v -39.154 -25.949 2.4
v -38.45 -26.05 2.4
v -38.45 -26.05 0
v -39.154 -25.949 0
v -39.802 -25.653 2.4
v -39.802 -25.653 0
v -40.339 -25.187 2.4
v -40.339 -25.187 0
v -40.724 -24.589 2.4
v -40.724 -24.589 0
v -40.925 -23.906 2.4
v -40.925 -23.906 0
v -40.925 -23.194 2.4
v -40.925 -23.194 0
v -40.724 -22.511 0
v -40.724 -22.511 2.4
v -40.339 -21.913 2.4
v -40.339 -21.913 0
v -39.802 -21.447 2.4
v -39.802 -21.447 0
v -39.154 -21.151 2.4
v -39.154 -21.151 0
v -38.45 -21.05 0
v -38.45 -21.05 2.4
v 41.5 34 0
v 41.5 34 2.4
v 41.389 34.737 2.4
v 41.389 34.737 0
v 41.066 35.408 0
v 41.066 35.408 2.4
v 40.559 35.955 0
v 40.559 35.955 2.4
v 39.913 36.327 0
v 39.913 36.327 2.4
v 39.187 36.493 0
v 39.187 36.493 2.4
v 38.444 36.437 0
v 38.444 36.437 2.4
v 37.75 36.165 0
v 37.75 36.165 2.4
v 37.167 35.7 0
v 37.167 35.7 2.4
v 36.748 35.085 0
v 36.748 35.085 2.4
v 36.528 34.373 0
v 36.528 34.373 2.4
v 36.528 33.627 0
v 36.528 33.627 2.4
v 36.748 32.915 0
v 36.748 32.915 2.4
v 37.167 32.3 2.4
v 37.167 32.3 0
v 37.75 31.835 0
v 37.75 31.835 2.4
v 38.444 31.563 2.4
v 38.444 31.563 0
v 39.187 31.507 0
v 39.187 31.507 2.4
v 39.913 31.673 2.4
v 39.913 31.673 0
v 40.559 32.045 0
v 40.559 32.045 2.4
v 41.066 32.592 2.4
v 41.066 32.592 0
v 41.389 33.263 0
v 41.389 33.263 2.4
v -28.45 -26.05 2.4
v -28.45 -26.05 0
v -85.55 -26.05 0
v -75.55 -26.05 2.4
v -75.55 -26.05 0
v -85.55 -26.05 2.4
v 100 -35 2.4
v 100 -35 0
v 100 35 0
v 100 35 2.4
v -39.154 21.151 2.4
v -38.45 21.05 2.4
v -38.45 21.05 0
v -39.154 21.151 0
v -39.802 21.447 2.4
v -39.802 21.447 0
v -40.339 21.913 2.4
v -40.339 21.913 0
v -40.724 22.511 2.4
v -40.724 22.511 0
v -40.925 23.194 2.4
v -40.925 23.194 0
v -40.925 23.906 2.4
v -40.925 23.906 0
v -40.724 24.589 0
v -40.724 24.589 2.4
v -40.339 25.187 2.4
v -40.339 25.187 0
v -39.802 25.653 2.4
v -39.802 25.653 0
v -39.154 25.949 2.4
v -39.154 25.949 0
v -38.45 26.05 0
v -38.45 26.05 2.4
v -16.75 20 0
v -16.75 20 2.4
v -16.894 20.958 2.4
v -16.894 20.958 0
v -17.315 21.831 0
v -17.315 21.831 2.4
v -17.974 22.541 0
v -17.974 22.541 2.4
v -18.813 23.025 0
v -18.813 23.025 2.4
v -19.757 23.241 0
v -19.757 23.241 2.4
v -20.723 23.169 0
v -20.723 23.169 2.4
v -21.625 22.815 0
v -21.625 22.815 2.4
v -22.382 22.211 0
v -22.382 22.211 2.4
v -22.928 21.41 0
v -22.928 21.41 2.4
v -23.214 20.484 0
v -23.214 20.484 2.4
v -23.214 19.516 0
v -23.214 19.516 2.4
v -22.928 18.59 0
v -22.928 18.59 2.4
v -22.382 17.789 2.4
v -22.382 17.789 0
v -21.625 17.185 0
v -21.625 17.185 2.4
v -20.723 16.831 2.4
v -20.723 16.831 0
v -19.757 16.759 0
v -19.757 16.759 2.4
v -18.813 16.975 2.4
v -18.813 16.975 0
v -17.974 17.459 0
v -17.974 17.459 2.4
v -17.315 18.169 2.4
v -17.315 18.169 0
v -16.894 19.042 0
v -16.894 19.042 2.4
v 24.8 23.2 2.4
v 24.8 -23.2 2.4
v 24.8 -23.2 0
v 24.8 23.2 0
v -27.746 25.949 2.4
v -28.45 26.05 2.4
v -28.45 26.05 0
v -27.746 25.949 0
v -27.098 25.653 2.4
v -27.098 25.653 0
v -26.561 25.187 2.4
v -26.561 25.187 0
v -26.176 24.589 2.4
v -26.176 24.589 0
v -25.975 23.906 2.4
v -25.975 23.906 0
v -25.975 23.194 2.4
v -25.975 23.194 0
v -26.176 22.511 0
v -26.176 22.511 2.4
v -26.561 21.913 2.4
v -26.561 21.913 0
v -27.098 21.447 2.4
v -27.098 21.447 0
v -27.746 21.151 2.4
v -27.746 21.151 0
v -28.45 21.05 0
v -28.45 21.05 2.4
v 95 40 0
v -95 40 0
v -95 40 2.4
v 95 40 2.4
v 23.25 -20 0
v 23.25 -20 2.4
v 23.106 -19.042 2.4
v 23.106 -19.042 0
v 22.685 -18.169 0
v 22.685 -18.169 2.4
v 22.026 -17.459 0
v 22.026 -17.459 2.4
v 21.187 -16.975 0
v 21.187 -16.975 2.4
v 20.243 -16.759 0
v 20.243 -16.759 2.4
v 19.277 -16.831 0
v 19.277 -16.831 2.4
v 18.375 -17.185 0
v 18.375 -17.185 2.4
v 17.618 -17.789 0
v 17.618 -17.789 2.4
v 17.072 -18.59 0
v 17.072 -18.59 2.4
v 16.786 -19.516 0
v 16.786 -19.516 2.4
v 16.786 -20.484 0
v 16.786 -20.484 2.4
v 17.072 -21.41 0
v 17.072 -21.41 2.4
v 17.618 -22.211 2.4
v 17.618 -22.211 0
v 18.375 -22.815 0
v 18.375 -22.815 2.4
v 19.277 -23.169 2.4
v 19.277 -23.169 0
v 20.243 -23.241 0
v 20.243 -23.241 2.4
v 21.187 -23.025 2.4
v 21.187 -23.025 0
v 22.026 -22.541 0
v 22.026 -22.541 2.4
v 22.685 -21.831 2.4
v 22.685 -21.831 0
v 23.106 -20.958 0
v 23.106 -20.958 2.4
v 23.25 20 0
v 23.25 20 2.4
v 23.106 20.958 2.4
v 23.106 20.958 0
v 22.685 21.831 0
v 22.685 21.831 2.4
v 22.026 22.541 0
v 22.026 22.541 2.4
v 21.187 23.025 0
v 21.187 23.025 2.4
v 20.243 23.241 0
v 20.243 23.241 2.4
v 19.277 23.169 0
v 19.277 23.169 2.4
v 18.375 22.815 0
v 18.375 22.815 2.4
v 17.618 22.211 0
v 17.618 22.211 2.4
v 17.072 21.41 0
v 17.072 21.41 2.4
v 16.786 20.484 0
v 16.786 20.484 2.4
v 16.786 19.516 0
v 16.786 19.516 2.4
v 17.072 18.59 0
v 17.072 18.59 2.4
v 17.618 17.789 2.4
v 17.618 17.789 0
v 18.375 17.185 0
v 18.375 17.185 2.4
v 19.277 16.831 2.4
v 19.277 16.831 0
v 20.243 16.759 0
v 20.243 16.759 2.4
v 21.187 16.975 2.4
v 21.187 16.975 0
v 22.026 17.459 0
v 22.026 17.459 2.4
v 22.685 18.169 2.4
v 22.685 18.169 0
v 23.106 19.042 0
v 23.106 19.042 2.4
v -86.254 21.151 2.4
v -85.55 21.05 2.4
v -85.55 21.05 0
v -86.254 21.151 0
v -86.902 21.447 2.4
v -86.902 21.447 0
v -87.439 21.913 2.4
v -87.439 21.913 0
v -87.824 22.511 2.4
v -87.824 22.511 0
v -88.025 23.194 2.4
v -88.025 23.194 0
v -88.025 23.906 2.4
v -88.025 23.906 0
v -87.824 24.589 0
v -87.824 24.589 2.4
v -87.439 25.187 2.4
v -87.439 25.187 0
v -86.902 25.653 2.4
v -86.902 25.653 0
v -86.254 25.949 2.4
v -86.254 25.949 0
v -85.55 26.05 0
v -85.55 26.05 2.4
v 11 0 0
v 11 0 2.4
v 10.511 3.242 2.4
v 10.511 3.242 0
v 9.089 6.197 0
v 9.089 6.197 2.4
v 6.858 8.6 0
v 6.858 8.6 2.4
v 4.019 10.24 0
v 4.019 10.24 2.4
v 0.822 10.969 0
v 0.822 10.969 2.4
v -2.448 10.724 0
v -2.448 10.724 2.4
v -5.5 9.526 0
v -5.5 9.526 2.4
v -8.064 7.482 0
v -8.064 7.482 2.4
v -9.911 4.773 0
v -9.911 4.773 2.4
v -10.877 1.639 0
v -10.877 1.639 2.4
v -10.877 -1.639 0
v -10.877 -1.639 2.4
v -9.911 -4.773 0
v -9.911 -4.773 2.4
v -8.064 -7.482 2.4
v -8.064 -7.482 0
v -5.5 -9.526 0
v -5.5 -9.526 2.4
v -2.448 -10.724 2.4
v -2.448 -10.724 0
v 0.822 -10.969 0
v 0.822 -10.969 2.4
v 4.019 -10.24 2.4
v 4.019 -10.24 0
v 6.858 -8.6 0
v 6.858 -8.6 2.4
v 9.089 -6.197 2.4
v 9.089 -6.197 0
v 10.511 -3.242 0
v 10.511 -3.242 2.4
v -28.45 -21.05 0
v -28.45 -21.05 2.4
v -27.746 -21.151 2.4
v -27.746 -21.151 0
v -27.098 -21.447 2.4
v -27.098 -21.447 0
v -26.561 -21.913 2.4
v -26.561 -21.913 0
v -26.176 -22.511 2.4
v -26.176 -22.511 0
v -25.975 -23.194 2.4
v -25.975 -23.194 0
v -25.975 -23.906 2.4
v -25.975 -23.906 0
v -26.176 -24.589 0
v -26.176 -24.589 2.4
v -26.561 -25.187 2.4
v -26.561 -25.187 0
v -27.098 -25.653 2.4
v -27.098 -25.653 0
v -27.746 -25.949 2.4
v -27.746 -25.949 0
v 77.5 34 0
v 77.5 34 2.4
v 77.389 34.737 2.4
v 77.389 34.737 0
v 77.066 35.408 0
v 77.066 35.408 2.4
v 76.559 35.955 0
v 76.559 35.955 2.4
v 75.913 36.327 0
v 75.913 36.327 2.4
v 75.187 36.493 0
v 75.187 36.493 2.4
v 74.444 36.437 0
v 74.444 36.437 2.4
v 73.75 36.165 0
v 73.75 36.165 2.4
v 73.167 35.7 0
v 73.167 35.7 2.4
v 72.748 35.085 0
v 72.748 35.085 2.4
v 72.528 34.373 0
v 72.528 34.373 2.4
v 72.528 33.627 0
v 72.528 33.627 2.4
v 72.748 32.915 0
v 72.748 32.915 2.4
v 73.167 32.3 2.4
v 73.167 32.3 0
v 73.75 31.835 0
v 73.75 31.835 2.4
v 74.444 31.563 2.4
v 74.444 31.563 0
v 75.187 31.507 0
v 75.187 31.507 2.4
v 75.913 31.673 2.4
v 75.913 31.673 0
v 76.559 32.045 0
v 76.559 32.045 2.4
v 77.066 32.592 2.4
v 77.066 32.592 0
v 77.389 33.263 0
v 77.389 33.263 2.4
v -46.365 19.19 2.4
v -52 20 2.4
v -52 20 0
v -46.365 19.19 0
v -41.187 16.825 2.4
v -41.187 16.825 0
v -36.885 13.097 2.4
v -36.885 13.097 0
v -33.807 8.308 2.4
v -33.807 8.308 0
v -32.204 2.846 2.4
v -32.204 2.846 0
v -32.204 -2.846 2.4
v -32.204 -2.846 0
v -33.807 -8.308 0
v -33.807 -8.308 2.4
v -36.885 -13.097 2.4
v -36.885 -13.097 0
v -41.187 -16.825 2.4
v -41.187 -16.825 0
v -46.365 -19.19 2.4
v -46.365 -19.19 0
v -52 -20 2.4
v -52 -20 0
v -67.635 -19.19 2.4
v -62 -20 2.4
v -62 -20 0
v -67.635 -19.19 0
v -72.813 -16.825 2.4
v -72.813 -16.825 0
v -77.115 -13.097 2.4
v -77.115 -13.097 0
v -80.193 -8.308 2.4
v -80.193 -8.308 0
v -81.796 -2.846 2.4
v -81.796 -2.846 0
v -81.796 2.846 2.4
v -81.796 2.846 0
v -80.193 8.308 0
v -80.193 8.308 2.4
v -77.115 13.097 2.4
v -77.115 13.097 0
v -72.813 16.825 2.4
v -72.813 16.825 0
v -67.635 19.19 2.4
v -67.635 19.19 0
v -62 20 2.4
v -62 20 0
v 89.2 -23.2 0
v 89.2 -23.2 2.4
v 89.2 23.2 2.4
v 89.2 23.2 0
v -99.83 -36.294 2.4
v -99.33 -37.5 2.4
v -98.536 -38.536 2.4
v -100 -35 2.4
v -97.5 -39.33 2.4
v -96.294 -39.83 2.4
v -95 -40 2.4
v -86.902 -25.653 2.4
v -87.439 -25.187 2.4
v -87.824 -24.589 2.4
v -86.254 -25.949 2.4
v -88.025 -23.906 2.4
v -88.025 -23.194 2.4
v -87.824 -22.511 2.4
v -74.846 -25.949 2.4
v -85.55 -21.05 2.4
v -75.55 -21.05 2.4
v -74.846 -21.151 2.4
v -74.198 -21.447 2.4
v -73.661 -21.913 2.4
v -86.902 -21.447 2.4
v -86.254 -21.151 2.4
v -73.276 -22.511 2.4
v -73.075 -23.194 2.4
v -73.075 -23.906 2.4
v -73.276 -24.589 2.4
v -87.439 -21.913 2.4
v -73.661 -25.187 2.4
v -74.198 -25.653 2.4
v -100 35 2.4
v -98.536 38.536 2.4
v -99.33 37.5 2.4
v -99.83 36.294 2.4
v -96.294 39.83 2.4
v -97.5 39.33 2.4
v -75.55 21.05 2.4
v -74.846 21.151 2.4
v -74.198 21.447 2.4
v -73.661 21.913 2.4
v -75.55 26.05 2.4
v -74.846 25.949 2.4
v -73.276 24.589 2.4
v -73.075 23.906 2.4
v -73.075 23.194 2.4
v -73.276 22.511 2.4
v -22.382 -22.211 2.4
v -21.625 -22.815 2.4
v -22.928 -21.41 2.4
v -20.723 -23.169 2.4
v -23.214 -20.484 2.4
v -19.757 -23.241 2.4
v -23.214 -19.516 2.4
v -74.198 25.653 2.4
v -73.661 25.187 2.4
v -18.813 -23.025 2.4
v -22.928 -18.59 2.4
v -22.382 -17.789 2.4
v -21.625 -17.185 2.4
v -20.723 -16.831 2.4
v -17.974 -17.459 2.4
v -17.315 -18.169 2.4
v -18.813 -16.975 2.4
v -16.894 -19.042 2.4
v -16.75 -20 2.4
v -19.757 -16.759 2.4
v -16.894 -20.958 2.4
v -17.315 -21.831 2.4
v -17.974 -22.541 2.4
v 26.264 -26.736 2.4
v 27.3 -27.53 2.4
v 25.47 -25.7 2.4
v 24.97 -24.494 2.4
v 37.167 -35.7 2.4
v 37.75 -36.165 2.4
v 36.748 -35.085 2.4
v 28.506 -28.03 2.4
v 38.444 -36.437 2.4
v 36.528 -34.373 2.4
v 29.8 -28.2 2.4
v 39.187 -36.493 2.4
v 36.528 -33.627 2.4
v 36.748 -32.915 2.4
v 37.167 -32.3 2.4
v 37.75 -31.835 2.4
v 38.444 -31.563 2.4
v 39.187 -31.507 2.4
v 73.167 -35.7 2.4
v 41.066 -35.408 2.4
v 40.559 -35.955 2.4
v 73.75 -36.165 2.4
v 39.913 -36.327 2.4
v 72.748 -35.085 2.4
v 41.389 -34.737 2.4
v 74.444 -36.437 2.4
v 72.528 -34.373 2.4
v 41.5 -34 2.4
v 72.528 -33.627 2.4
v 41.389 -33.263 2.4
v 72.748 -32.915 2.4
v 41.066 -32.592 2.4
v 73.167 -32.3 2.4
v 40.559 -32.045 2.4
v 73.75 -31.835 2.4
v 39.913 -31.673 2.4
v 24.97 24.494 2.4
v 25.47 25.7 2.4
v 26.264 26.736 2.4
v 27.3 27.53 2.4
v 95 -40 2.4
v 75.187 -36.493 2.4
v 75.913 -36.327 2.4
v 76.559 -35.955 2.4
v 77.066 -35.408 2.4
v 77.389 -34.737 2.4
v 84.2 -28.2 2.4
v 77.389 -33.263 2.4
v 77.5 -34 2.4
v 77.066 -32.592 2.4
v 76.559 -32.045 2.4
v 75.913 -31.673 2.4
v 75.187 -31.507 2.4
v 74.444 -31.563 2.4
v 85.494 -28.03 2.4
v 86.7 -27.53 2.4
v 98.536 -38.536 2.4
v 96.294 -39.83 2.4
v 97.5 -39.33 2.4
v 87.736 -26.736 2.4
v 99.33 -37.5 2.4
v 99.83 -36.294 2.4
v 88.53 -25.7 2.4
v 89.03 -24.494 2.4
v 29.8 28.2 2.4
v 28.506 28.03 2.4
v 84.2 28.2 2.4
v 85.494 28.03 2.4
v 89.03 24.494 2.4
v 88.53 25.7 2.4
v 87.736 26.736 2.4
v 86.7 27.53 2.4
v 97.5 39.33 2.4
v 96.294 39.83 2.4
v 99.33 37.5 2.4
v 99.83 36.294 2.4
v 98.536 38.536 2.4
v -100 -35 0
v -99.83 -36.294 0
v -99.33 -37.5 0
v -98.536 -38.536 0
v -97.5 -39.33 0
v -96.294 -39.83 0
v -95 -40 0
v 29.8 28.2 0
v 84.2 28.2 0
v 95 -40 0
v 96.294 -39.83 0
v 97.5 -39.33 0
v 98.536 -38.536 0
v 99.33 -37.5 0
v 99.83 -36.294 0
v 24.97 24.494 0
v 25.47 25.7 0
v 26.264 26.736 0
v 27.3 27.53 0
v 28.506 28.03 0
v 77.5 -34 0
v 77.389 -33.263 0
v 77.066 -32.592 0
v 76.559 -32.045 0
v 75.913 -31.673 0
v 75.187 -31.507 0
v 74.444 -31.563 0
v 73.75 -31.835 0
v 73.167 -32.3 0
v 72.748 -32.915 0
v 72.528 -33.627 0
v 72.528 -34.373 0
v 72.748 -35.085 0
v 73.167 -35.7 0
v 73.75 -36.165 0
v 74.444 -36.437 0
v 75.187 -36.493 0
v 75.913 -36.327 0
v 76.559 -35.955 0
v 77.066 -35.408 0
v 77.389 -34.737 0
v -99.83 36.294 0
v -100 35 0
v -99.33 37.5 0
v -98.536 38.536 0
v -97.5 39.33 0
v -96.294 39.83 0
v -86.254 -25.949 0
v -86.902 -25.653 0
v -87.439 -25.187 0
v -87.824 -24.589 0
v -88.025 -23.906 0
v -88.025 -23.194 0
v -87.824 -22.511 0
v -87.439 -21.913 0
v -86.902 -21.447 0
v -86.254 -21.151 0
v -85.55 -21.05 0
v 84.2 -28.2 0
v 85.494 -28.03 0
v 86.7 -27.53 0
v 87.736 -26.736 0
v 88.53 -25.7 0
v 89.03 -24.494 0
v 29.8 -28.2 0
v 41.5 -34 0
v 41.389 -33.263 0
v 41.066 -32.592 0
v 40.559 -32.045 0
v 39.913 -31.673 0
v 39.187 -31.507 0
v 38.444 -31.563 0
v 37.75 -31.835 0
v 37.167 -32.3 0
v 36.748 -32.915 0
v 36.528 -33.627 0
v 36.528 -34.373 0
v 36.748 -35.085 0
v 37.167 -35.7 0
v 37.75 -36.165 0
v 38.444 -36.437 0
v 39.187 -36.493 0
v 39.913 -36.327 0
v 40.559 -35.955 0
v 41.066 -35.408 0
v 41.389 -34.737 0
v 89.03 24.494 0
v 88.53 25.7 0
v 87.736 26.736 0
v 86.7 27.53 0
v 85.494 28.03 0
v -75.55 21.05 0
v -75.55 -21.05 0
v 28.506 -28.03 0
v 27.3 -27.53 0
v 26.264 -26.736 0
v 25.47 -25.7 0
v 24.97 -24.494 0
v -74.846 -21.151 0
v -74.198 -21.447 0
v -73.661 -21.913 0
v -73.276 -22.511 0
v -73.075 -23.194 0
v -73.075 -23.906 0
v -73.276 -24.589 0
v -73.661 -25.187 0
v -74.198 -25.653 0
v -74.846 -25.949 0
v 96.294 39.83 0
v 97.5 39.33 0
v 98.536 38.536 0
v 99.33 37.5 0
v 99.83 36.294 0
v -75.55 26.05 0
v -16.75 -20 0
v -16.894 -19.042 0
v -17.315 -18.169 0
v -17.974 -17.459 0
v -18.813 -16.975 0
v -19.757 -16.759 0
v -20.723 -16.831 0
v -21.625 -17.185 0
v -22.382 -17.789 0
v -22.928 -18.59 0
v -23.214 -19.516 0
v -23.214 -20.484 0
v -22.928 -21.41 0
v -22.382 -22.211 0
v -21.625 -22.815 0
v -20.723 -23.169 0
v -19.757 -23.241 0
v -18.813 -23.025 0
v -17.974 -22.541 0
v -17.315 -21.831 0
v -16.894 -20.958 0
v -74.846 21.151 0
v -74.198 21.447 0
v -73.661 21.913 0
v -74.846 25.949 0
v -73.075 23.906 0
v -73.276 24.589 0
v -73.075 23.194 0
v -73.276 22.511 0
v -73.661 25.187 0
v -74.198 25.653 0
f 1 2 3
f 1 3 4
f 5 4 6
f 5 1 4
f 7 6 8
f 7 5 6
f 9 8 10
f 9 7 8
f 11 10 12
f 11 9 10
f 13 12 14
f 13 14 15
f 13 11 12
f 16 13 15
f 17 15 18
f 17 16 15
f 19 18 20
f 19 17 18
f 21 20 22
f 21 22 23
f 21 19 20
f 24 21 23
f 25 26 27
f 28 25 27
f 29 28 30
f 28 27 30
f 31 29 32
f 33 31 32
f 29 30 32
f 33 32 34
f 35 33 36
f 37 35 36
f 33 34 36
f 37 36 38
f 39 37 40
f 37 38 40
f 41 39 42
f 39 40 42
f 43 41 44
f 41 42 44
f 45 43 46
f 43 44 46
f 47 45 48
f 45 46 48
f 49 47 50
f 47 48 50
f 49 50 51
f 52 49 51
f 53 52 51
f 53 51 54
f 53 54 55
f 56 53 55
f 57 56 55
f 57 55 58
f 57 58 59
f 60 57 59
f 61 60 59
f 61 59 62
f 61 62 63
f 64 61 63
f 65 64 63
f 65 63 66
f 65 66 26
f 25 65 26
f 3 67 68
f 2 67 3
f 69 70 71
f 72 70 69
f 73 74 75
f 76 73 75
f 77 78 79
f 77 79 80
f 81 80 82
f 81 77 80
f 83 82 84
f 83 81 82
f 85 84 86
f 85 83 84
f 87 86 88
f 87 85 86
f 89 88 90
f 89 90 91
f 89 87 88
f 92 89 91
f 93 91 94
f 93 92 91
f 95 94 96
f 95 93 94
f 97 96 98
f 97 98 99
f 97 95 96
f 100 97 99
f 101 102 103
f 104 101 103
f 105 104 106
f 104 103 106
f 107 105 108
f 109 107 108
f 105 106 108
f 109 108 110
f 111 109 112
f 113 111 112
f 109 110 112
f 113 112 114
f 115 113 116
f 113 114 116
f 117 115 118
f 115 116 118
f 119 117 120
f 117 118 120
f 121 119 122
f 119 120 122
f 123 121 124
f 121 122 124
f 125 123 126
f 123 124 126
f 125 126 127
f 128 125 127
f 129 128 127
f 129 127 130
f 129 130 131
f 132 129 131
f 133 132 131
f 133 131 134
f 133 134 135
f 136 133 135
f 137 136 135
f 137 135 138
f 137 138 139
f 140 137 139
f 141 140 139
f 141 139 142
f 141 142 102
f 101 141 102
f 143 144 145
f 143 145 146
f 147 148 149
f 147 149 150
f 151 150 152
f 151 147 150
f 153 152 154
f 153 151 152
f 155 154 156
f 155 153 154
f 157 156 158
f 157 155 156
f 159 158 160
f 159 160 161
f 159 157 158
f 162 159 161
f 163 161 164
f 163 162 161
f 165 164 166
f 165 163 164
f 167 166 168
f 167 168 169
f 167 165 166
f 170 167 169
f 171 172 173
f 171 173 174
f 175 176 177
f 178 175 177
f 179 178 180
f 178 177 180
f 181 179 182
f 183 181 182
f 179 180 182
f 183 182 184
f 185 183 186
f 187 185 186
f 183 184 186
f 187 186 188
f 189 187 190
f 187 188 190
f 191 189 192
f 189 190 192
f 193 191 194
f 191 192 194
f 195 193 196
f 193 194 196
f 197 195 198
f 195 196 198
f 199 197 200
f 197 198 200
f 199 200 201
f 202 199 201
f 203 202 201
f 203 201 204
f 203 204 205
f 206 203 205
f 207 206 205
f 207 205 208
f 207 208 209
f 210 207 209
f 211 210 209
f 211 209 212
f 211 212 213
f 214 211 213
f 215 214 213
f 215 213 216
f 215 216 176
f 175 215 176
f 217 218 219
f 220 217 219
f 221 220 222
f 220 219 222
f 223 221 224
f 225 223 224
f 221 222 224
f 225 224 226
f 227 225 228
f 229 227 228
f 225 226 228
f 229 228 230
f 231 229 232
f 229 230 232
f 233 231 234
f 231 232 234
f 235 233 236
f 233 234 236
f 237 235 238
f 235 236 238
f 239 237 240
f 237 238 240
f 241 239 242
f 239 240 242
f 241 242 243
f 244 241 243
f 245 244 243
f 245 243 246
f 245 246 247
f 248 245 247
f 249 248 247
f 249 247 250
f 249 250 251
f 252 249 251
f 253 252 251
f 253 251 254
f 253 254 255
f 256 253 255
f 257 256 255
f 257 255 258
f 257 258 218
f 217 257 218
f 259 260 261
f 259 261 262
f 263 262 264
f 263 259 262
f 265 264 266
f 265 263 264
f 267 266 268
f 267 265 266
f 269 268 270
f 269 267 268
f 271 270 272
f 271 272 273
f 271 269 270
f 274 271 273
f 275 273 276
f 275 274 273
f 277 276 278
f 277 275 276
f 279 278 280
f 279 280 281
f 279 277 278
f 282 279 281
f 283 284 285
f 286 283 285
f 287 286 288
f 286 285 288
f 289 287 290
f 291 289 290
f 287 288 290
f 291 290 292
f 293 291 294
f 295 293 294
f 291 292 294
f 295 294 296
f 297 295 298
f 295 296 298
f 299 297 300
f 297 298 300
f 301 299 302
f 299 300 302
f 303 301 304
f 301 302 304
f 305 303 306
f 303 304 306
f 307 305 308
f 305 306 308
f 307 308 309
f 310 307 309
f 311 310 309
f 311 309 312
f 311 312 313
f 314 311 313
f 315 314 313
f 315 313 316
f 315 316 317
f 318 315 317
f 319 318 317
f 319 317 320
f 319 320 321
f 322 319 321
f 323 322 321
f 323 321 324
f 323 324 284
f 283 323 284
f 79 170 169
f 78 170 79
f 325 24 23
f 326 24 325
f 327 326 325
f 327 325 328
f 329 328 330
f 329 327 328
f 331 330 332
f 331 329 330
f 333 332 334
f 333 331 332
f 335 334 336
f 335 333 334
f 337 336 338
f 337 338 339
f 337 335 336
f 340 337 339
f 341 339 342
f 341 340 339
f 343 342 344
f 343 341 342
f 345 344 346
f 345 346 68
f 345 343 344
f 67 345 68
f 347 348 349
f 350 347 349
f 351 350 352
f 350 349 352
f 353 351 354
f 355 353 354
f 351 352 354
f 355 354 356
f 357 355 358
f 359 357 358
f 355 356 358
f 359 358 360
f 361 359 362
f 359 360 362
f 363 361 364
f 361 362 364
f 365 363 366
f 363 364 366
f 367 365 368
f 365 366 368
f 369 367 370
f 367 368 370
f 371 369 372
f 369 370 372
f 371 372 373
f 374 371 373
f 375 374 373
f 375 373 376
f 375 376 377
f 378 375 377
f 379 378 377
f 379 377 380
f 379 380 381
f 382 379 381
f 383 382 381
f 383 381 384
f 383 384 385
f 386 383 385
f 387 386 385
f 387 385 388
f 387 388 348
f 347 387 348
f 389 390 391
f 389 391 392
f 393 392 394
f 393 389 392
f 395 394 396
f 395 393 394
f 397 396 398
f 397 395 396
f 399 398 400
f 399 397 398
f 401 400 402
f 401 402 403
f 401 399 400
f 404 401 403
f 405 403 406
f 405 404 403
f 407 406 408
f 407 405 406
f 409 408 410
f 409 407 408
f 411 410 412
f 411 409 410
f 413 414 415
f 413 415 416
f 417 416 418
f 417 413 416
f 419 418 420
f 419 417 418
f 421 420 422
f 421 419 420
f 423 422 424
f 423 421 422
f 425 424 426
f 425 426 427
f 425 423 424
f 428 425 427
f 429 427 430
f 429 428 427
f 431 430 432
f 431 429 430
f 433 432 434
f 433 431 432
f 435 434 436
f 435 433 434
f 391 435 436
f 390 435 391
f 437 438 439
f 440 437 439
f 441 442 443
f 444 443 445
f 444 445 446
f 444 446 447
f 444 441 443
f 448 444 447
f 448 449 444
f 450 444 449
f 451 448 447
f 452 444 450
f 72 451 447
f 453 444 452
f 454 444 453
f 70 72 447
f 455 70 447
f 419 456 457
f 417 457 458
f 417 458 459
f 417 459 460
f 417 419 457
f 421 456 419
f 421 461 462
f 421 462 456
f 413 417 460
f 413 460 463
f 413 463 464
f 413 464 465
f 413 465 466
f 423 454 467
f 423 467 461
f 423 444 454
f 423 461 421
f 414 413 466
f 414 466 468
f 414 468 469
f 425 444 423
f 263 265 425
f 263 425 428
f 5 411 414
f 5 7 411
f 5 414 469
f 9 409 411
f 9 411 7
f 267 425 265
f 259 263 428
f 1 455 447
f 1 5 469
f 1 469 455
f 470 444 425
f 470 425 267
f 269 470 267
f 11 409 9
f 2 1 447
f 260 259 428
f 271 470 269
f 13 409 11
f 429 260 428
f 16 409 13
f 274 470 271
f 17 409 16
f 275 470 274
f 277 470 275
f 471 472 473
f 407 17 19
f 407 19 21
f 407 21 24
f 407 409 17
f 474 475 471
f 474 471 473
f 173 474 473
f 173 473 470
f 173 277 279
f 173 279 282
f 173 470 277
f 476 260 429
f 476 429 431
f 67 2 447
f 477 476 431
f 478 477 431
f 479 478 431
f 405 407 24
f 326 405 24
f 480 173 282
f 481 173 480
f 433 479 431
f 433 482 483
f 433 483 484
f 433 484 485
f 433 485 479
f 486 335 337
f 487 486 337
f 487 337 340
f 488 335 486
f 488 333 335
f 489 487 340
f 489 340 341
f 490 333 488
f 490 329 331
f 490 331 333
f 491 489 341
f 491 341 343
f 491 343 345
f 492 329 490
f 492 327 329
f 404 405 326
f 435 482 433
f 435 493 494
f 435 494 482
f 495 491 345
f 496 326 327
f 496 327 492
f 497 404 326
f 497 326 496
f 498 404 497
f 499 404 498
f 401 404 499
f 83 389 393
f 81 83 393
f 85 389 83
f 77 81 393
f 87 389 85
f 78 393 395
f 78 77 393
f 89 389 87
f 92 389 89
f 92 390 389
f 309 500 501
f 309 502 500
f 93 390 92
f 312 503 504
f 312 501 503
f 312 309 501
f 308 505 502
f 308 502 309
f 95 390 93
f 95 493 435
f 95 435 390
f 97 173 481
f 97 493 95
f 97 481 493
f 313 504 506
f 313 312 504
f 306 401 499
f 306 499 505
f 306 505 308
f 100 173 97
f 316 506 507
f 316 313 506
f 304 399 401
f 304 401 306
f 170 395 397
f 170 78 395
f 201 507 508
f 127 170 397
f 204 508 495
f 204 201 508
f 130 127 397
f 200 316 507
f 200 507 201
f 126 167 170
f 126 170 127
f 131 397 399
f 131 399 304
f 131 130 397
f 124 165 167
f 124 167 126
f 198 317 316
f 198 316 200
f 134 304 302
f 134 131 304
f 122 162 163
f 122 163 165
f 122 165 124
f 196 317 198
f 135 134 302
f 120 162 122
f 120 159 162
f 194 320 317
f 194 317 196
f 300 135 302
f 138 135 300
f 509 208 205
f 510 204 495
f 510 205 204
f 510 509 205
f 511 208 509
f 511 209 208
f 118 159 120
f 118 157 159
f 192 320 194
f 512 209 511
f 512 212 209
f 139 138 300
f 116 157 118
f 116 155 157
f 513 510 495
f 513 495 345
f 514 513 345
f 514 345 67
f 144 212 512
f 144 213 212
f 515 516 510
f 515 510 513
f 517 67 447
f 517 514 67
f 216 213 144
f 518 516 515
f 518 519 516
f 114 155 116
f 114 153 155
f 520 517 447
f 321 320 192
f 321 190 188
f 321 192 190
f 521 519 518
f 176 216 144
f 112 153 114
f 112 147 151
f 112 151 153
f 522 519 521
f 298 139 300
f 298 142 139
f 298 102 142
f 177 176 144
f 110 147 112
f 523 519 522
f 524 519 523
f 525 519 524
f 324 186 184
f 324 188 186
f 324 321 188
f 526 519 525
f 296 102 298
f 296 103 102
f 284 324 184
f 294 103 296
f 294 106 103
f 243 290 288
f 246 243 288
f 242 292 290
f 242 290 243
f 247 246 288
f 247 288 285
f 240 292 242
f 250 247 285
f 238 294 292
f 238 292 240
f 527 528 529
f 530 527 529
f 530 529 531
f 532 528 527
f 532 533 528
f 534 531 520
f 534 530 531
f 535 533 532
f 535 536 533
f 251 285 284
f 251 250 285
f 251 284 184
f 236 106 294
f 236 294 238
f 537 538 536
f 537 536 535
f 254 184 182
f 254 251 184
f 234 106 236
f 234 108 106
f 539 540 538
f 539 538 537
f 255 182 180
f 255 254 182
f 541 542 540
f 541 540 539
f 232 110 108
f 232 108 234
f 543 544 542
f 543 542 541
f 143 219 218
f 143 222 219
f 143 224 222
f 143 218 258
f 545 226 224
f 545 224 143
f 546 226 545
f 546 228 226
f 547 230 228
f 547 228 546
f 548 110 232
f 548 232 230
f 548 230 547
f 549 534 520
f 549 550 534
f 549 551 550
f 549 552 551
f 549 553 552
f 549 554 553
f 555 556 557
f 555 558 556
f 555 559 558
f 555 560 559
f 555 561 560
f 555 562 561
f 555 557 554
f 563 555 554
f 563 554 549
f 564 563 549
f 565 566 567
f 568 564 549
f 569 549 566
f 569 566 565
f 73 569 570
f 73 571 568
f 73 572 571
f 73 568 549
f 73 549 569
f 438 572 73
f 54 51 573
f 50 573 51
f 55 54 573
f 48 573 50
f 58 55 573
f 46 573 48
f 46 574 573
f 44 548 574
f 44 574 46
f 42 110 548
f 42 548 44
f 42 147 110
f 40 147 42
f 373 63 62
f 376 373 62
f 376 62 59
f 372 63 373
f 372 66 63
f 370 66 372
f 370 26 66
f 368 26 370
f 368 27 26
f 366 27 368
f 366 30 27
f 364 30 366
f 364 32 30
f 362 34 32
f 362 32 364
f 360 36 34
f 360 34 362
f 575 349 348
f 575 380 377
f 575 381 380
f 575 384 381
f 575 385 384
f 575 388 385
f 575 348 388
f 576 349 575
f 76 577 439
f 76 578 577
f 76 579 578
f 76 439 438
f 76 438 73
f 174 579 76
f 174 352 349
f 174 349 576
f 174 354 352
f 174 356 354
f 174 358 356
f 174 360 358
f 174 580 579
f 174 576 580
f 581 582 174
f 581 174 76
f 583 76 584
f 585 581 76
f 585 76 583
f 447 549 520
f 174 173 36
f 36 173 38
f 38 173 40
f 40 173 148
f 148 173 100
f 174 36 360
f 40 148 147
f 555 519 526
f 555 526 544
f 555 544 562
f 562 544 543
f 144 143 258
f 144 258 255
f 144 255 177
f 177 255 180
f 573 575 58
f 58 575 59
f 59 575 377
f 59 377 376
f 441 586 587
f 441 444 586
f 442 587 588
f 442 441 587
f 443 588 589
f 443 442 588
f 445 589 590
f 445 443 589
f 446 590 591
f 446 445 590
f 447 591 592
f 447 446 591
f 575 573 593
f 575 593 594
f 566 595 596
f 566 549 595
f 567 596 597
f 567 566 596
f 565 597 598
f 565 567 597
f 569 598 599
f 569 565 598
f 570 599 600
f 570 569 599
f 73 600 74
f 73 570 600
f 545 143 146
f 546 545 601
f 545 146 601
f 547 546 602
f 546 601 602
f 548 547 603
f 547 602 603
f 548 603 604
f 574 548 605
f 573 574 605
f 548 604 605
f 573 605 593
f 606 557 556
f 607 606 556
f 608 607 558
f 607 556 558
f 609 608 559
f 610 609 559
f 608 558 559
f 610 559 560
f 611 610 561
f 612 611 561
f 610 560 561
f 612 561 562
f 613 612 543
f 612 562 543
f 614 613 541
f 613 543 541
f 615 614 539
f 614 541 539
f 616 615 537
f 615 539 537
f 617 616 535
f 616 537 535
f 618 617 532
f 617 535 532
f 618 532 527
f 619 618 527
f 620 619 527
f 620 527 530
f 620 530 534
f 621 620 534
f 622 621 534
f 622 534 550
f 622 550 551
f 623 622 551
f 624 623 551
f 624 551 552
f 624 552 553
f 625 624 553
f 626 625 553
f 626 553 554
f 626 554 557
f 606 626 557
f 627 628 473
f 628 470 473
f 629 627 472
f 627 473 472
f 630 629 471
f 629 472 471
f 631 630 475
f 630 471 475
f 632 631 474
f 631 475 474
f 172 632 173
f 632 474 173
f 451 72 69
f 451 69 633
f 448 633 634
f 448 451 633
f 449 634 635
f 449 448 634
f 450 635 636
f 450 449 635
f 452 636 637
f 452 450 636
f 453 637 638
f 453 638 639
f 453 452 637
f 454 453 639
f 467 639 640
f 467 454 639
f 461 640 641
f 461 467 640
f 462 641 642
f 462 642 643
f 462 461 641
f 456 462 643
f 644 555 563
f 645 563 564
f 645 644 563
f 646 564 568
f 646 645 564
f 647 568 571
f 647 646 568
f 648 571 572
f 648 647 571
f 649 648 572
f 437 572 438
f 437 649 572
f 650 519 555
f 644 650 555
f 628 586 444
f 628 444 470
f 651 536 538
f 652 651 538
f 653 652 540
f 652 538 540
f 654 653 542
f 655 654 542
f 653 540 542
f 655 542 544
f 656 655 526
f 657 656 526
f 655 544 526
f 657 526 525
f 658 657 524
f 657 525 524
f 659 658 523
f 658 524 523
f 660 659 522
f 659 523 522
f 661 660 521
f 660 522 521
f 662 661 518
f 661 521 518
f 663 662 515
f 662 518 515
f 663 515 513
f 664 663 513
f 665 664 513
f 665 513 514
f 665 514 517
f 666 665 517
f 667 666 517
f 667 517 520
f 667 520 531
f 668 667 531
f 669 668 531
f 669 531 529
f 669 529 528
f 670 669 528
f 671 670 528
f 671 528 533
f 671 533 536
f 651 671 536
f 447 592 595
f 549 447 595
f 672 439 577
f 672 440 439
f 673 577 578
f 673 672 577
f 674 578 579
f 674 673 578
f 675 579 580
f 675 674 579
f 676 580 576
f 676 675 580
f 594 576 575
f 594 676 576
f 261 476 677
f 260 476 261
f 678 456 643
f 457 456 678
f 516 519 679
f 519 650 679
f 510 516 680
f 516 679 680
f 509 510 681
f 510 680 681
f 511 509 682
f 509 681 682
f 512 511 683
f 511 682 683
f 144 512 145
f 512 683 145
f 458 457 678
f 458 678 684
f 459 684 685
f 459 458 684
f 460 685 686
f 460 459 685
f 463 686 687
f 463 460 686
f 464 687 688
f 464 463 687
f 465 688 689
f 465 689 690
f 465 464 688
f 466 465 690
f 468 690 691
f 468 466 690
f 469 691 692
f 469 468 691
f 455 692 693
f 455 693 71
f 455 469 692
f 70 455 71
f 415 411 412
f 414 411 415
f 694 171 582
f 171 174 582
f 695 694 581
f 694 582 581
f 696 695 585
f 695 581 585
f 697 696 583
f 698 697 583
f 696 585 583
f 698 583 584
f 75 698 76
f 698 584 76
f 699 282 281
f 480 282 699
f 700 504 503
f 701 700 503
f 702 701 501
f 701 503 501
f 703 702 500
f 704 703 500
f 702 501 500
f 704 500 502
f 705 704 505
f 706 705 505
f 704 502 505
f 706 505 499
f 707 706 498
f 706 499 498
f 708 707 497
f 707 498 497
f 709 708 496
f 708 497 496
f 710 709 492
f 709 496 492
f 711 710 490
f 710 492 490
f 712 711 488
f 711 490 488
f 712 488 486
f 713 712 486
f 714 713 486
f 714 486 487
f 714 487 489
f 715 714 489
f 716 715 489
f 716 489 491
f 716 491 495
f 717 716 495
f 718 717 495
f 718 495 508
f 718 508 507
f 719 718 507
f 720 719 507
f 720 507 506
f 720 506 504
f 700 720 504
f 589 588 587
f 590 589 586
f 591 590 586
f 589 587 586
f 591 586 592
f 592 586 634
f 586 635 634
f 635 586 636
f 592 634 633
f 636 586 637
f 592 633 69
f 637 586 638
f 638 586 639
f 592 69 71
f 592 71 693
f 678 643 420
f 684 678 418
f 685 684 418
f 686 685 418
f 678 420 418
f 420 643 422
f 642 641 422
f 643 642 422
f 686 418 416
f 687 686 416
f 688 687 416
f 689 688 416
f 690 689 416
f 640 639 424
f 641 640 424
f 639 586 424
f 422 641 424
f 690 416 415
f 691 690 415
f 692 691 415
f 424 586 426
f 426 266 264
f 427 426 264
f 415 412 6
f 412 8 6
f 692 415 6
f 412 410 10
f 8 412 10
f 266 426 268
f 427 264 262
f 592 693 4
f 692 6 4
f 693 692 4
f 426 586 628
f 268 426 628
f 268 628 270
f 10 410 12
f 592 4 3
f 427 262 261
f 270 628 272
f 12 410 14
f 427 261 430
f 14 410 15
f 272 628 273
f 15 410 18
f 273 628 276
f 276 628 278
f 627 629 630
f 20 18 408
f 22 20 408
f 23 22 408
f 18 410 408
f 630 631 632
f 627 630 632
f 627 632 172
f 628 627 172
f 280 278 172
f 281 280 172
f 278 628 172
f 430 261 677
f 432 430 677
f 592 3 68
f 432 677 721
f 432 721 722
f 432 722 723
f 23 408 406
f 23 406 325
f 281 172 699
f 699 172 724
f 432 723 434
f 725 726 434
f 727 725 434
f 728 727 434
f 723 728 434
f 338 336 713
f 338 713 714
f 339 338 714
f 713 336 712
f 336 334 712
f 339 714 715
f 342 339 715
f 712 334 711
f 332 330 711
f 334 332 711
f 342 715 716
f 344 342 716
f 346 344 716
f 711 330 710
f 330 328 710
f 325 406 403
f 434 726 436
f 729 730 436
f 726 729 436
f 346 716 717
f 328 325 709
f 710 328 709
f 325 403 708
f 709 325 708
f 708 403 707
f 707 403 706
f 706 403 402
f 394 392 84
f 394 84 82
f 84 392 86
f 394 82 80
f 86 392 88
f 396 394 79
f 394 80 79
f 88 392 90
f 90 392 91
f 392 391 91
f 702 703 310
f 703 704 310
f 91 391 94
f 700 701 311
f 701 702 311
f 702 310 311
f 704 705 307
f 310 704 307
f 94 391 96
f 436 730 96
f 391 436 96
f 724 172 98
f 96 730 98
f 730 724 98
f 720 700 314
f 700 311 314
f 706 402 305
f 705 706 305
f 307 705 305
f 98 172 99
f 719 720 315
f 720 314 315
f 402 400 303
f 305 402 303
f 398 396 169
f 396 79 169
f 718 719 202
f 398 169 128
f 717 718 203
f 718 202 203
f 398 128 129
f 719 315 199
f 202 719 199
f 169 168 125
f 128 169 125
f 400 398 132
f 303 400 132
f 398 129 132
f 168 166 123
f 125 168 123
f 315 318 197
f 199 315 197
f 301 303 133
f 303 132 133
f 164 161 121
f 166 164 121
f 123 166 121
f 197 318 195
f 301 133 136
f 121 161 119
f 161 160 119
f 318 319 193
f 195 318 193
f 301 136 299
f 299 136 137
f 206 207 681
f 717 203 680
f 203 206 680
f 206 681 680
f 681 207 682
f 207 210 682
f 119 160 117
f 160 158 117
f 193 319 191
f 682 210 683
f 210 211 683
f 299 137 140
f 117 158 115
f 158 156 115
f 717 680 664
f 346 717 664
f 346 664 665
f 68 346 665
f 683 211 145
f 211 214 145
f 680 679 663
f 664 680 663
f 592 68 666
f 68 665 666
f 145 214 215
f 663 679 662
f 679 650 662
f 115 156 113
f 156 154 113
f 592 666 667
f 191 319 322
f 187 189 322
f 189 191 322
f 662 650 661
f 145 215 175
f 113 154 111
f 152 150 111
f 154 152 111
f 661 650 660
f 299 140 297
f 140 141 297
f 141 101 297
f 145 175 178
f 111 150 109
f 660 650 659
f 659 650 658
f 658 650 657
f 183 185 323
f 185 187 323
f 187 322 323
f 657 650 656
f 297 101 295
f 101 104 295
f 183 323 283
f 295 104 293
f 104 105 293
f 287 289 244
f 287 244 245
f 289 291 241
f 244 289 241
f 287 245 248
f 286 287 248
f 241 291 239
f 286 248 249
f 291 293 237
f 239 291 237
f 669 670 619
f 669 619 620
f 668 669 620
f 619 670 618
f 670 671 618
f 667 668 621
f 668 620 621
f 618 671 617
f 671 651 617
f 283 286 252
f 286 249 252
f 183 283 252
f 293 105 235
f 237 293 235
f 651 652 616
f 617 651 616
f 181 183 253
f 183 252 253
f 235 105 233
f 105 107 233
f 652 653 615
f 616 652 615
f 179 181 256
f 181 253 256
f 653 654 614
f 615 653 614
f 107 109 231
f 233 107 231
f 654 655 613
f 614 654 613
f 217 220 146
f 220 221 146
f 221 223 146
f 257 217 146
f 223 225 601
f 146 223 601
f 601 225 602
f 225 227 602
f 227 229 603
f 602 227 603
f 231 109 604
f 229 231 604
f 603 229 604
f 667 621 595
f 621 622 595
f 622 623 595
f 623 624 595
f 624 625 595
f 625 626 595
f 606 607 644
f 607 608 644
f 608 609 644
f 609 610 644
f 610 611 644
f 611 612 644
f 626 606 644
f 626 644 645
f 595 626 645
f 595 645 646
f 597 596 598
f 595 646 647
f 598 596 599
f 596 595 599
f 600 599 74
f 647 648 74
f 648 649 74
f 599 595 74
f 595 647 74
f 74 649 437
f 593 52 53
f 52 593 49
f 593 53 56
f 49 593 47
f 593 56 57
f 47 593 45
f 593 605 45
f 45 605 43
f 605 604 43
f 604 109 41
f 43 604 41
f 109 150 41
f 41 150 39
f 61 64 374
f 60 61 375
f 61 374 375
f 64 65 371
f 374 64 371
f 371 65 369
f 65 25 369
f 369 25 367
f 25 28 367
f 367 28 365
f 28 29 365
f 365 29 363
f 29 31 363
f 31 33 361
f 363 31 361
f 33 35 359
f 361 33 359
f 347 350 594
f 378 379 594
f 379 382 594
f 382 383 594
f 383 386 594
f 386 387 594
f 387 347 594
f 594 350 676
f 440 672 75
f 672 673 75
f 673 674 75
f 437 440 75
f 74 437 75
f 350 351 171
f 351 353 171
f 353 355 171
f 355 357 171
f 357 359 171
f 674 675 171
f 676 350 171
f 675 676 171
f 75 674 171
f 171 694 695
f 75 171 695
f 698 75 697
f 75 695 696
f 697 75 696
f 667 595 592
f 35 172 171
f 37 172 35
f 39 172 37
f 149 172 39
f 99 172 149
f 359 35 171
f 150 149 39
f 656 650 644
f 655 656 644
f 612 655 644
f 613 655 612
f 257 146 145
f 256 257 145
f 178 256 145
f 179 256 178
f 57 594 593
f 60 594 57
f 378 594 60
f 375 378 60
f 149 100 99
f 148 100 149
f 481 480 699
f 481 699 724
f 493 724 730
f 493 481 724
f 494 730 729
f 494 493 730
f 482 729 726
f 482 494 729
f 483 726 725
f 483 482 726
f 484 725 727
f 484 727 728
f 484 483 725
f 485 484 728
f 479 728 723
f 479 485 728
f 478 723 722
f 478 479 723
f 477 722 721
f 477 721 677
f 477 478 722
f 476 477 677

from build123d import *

# Parameters (mm, degrees)
CROQUIS1_W              = 200
CROQUIS1_H              = 80
SALIENTE_EXTRUIR1_DEPTH = 2.4
CROQUIS2_R              = 11
CORTAR_EXTRUIR1_DEPTH   = 108.730032953
CROQUIS3_R              = 3.25
CORTAR_EXTRUIR2_DEPTH   = 108.730032953
CORTAR_EXTRUIR3_DEPTH   = 2.4
CROQUIS7_W              = 64.4
CROQUIS7_H              = 56.4
CORTAR_EXTRUIR4_DEPTH   = 108.730032953
CROQUIS8_R              = 2.5
CORTAR_EXTRUIR5_DEPTH   = 108.730032953
REDONDEO1_R             = 5
REDONDEO2_R             = 5


with BuildPart() as part:
    # Croquis1 → Saliente-Extruir1 (new body)
    with BuildSketch(Plane.XY):
        Rectangle(CROQUIS1_W, CROQUIS1_H)
    extrude(amount=SALIENTE_EXTRUIR1_DEPTH)

    # Croquis2 → Cortar-Extruir1 (cut, through all)
    with BuildSketch(Plane.XY.offset(2.4)):
        Circle(CROQUIS2_R)
    extrude(amount=-CORTAR_EXTRUIR1_DEPTH, mode=Mode.SUBTRACT)

    # Croquis3 → Cortar-Extruir2 (cut, through all)
    with BuildSketch(Plane.XY.offset(2.4)):
        with Locations((20, 20)):
            Circle(CROQUIS3_R)
        with Locations((-20, 20)):
            Circle(CROQUIS3_R)
        with Locations((-20, -20)):
            Circle(CROQUIS3_R)
        with Locations((20, -20)):
            Circle(CROQUIS3_R)
    extrude(amount=-CORTAR_EXTRUIR2_DEPTH, mode=Mode.SUBTRACT)

    # Croquis4 → Cortar-Extruir3 (cut)
    with BuildSketch(Plane.XY.offset(2.4)):
        with BuildLine():
            Line((-62, 20), (-52, 20))
            ThreePointArc((-52, 20), (-32, 0), (-52, -20))
            Line((-52, -20), (-62, -20))
            ThreePointArc((-62, -20), (-82, 0), (-62, 20))
        make_face()
        with BuildLine():
            Line((-85.55, 26.05), (-75.55, 26.05))
            ThreePointArc((-75.55, 26.05), (-73.05, 23.55), (-75.55, 21.05))
            Line((-75.55, 21.05), (-85.55, 21.05))
            ThreePointArc((-85.55, 21.05), (-88.05, 23.55), (-85.55, 26.05))
        make_face()
        with BuildLine():
            Line((-28.45, 21.05), (-38.45, 21.05))
            ThreePointArc((-38.45, 21.05), (-40.95, 23.55), (-38.45, 26.05))
            Line((-38.45, 26.05), (-28.45, 26.05))
            ThreePointArc((-28.45, 26.05), (-25.95, 23.55), (-28.45, 21.05))
        make_face()
        with BuildLine():
            Line((-28.45, -26.05), (-38.45, -26.05))
            ThreePointArc((-38.45, -26.05), (-40.95, -23.55), (-38.45, -21.05))
            Line((-38.45, -21.05), (-28.45, -21.05))
            ThreePointArc((-28.45, -21.05), (-25.95, -23.55), (-28.45, -26.05))
        make_face()
        with BuildLine():
            Line((-85.55, -21.05), (-75.55, -21.05))
            ThreePointArc((-75.55, -21.05), (-73.05, -23.55), (-75.55, -26.05))
            Line((-75.55, -26.05), (-85.55, -26.05))
            ThreePointArc((-85.55, -26.05), (-88.05, -23.55), (-85.55, -21.05))
        make_face()
    extrude(amount=-CORTAR_EXTRUIR3_DEPTH, mode=Mode.SUBTRACT)

    # Croquis7 → Cortar-Extruir4 (cut, through all)
    with BuildSketch(Plane.XY.offset(2.4)):
        with Locations((57, 0)):
            Rectangle(CROQUIS7_W, CROQUIS7_H)
    extrude(amount=-CORTAR_EXTRUIR4_DEPTH, mode=Mode.SUBTRACT)

    # Croquis8 → Cortar-Extruir5 (cut, through all)
    with BuildSketch(Plane.XY.offset(2.4)):
        with Locations((39, 34)):
            Circle(CROQUIS8_R)
        with Locations((75, 34)):
            Circle(CROQUIS8_R)
        with Locations((39, -34)):
            Circle(CROQUIS8_R)
        with Locations((75, -34)):
            Circle(CROQUIS8_R)
    extrude(amount=-CORTAR_EXTRUIR5_DEPTH, mode=Mode.SUBTRACT)

    # Redondeo1
    redondeo1_edges = [part.edges().sort_by_distance(p)[0] for p in [
        (89.2, 28.2, 1.2),
        (89.2, -28.2, 1.2),
        (24.8, -28.2, 1.2),
        (24.8, 28.2, 1.2),
    ]]
    fillet(redondeo1_edges, radius=REDONDEO1_R)

    # Redondeo2
    redondeo2_edges = [part.edges().sort_by_distance(p)[0] for p in [
        (100, -40, 1.2),
        (-100, -40, 1.2),
        (-100, 40, 1.2),
        (100, 40, 1.2),
    ]]
    fillet(redondeo2_edges, radius=REDONDEO2_R)


solid = part.part
